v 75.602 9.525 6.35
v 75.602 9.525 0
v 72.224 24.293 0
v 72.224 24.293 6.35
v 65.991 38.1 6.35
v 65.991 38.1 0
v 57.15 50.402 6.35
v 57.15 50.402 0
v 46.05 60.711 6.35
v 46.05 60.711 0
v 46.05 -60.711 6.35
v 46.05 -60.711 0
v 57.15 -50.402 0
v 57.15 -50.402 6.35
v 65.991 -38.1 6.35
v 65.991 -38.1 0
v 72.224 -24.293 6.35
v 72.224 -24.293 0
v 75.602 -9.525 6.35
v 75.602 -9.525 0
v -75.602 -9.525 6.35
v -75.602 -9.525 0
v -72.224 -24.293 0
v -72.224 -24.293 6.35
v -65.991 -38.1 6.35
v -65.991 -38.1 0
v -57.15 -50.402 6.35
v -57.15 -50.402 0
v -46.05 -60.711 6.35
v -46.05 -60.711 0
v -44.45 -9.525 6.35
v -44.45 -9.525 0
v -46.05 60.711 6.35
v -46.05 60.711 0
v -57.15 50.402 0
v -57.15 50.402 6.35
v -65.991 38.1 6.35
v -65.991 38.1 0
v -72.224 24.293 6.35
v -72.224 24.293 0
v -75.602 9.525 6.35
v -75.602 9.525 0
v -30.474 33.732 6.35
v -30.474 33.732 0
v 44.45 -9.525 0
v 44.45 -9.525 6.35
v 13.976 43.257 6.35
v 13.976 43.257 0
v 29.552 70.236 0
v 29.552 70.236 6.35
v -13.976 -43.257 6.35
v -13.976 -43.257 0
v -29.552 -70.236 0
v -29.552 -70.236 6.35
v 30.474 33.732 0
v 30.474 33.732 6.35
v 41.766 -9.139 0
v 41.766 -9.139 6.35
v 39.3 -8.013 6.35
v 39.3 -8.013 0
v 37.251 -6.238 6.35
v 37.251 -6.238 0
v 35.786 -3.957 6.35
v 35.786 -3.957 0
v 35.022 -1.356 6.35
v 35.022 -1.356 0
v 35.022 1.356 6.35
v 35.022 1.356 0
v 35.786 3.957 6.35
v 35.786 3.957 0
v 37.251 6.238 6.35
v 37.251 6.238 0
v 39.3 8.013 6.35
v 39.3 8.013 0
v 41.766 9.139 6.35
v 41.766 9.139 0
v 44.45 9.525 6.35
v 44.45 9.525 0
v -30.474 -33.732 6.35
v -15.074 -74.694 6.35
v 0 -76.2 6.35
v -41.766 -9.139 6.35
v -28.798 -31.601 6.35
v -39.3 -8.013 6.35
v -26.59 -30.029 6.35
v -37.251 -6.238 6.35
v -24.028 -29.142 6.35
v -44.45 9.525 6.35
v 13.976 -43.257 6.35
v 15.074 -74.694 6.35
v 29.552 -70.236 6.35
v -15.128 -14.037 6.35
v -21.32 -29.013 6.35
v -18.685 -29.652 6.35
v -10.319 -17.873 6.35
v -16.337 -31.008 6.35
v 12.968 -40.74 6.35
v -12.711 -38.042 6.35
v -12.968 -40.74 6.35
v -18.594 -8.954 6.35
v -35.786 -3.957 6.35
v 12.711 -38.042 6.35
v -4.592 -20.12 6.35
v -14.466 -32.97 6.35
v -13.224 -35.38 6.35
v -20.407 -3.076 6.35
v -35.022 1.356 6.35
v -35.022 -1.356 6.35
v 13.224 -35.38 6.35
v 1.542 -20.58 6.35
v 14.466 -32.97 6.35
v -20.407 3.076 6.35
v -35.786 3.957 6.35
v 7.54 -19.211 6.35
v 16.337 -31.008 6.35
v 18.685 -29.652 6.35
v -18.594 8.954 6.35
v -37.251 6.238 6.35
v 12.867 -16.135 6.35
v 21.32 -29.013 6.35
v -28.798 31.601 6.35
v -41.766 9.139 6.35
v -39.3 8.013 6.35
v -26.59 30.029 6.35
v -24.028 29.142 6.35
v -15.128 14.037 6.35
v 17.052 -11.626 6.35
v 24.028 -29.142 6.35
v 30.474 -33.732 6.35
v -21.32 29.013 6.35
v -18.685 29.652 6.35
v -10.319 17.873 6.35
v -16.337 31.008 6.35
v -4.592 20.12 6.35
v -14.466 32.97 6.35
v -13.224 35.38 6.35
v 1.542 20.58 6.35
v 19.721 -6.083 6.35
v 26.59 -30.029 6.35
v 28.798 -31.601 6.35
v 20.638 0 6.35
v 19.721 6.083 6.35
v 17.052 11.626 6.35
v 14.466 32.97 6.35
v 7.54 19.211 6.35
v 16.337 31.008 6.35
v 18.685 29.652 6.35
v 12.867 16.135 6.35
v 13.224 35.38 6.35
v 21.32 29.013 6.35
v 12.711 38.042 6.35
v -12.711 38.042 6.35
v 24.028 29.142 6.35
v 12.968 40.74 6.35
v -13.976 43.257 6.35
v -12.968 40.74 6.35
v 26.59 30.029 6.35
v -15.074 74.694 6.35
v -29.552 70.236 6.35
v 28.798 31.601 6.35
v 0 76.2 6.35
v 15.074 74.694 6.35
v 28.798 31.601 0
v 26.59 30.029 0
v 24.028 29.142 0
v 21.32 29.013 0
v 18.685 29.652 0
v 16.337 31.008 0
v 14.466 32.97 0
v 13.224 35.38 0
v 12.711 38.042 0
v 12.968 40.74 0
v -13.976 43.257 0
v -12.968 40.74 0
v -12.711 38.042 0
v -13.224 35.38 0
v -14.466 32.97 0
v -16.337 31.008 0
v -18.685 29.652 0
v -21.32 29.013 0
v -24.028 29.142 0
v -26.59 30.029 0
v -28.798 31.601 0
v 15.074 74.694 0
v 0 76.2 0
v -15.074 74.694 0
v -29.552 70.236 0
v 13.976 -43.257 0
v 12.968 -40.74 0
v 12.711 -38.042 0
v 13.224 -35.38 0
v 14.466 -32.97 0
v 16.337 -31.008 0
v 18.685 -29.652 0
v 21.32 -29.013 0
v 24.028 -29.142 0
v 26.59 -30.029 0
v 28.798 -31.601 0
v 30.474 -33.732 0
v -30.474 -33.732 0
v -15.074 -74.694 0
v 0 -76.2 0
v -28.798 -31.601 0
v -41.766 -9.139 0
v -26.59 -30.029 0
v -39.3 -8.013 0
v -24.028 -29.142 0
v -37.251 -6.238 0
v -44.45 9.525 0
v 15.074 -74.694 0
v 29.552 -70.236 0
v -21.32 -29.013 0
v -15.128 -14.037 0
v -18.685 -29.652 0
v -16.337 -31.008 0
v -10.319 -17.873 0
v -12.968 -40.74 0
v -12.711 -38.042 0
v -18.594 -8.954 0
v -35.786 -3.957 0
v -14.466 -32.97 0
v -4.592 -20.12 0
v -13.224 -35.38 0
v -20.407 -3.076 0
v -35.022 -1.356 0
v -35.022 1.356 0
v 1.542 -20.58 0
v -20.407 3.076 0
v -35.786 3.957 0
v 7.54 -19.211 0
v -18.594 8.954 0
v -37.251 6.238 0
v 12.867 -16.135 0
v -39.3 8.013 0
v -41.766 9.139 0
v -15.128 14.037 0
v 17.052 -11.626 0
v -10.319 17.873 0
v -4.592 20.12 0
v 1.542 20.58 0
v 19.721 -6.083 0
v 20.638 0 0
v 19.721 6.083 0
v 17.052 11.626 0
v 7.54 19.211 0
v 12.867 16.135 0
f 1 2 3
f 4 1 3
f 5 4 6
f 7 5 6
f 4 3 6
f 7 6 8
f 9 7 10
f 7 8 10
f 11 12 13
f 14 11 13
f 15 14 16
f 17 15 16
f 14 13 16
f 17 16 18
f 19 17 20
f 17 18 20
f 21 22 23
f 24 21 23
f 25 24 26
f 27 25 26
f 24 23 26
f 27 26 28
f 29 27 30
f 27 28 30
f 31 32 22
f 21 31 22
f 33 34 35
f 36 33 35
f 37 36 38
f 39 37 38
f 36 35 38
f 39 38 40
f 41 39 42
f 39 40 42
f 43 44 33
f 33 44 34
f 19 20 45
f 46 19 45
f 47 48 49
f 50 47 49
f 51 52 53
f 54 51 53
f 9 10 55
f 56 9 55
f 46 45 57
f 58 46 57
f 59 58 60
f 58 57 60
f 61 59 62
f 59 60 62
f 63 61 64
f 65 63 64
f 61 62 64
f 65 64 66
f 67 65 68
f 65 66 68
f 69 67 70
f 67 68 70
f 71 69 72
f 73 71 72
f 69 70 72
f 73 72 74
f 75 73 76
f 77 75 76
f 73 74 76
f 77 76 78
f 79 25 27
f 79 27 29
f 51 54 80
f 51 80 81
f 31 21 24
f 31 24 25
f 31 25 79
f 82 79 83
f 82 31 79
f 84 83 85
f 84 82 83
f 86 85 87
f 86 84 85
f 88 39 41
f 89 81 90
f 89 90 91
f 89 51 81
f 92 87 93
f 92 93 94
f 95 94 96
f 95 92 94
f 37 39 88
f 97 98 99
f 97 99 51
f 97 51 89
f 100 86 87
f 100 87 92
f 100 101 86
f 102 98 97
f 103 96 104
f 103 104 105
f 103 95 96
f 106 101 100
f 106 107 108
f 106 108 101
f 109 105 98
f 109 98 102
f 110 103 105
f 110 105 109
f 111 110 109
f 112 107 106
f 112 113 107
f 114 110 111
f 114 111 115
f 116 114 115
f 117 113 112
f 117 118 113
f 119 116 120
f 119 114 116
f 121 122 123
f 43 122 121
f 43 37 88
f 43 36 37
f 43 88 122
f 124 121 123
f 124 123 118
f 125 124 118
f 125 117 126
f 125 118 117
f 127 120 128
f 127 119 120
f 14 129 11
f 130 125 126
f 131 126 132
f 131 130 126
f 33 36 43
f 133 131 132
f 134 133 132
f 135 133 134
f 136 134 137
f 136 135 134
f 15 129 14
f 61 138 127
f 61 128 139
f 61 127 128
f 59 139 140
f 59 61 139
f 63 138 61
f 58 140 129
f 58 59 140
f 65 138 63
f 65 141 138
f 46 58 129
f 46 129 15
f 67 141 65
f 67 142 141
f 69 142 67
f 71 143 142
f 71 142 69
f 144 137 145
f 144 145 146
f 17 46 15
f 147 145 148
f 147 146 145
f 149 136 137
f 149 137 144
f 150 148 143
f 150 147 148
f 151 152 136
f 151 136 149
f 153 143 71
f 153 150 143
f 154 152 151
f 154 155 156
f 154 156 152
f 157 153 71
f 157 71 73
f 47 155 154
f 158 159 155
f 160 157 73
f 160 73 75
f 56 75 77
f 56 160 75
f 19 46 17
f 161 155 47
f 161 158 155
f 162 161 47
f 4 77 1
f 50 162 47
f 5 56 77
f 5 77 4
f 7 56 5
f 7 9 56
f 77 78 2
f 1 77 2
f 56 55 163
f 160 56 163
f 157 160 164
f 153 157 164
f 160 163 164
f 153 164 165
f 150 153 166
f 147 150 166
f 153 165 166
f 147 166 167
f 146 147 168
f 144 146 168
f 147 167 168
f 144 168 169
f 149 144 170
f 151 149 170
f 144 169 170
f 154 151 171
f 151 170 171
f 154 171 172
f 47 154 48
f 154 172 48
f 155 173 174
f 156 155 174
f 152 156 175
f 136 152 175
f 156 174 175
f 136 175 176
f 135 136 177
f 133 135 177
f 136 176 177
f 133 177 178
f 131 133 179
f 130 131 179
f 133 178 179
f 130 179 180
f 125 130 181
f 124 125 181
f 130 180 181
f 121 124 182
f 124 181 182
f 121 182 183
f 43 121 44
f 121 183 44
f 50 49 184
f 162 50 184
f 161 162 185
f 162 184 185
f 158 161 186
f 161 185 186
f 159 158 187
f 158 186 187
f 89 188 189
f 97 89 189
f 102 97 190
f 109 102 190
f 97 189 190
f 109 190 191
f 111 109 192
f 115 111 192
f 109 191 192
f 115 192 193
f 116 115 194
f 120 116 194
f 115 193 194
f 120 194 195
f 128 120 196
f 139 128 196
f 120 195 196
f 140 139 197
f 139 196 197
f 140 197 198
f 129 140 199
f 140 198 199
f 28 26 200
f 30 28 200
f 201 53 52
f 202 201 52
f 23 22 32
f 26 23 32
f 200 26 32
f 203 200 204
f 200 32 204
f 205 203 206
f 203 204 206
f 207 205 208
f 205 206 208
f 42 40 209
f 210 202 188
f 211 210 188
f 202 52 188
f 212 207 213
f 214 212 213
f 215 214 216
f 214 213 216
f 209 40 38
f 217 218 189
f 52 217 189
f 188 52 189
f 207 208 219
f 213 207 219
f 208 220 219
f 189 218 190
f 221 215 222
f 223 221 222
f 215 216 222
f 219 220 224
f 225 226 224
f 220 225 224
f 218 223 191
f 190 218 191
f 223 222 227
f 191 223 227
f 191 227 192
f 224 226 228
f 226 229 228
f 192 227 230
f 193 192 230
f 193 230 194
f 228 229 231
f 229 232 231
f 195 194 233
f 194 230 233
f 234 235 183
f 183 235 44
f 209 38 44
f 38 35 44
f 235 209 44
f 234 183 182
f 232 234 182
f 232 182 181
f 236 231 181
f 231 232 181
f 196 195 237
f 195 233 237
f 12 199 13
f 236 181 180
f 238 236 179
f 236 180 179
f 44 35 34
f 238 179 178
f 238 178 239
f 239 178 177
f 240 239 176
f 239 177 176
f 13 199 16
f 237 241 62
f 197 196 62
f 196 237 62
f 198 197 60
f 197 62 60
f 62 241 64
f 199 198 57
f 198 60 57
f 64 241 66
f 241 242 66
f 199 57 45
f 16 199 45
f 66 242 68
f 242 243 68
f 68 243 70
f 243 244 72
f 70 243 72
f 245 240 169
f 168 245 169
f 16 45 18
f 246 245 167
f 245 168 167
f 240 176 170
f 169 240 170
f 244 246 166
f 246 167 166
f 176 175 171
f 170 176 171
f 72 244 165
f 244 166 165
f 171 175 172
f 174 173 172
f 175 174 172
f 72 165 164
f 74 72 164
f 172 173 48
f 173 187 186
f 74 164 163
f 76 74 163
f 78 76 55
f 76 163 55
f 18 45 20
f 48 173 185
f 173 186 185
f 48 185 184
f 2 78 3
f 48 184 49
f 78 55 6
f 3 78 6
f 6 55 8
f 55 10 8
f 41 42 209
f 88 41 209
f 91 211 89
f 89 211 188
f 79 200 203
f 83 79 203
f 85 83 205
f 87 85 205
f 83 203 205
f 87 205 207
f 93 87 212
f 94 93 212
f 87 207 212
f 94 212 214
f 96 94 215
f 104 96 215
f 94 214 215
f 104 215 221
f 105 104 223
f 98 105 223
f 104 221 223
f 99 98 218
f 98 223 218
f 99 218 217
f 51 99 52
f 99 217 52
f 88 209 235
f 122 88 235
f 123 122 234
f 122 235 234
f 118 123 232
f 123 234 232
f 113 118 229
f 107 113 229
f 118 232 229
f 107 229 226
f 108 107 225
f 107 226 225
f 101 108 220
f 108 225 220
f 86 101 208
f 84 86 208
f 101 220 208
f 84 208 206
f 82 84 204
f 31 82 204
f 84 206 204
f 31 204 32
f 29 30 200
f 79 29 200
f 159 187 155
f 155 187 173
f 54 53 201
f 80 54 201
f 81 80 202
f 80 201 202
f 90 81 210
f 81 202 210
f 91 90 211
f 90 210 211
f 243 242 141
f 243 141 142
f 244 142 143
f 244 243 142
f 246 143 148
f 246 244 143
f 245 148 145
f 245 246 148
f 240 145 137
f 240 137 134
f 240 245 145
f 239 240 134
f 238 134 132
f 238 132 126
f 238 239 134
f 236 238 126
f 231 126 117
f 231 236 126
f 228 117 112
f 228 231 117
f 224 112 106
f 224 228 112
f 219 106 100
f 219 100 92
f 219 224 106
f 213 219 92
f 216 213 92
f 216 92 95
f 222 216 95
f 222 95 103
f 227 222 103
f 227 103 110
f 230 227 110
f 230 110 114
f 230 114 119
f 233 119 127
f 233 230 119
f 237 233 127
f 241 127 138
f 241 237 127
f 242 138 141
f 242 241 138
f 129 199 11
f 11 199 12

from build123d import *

# Parameters (mm, degrees)
F0_R     = 20.6375
F1_DEPTH = 6.35


# Not quite as in the source:
# - a feature names something its author has since deleted; it is built from what else it names


with BuildPart() as f1:
    # F0 (on Top) → F1 (new body)
    with BuildSketch(Plane.XY):
        with BuildLine():
            Line((-44.45, -9.525), (-75.6023437137, -9.525))
            ThreePointArc((-75.6023437137, -9.525), (-65.9911357684, -38.1), (-46.0500638279, -60.7110502417))
            Line((-46.0500638279, -60.7110502417), (-30.473891971, -33.7323291982))
            ThreePointArc((-30.473891971, -33.7323291982), (-17.4625, -30.2459372272), (-13.976108029, -43.2573291982))
            Line((-13.976108029, -43.2573291982), (-29.5522798858, -70.2360502417))
            ThreePointArc((-29.5522798858, -70.2360502417), (0, -76.2), (29.5522798858, -70.2360502417))
            Line((29.5522798858, -70.2360502417), (13.976108029, -43.2573291982))
            ThreePointArc((13.976108029, -43.2573291982), (17.4625, -30.2459372272), (30.473891971, -33.7323291982))
            Line((30.473891971, -33.7323291982), (46.0500638279, -60.7110502417))
            ThreePointArc((46.0500638279, -60.7110502417), (65.9911357684, -38.1), (75.6023437137, -9.525))
            Line((75.6023437137, -9.525), (44.45, -9.525))
            ThreePointArc((44.45, -9.525), (34.925, 0), (44.45, 9.525))
            Line((44.45, 9.525), (75.6023437137, 9.525))
            ThreePointArc((75.6023437137, 9.525), (65.9911357684, 38.1), (46.0500638279, 60.7110502417))
            Line((46.0500638279, 60.7110502417), (30.473891971, 33.7323291982))
            ThreePointArc((30.473891971, 33.7323291982), (17.4625, 30.2459372272), (13.976108029, 43.2573291982))
            Line((13.976108029, 43.2573291982), (29.5522798858, 70.2360502417))
            ThreePointArc((29.5522798858, 70.2360502417), (0, 76.2), (-29.5522798858, 70.2360502417))
            Line((-29.5522798858, 70.2360502417), (-13.976108029, 43.2573291982))
            ThreePointArc((-13.976108029, 43.2573291982), (-17.4625, 30.2459372272), (-30.473891971, 33.7323291982))
            Line((-30.473891971, 33.7323291982), (-46.0500638279, 60.7110502417))
            ThreePointArc((-46.0500638279, 60.7110502417), (-65.9911357684, 38.1), (-75.6023437137, 9.525))
            Line((-75.6023437137, 9.525), (-44.45, 9.525))
            ThreePointArc((-44.45, 9.525), (-34.925, 0), (-44.45, -9.525))
        make_face()
        Circle(F0_R, mode=Mode.SUBTRACT)
    extrude(amount=F1_DEPTH)


solid = f1.part
